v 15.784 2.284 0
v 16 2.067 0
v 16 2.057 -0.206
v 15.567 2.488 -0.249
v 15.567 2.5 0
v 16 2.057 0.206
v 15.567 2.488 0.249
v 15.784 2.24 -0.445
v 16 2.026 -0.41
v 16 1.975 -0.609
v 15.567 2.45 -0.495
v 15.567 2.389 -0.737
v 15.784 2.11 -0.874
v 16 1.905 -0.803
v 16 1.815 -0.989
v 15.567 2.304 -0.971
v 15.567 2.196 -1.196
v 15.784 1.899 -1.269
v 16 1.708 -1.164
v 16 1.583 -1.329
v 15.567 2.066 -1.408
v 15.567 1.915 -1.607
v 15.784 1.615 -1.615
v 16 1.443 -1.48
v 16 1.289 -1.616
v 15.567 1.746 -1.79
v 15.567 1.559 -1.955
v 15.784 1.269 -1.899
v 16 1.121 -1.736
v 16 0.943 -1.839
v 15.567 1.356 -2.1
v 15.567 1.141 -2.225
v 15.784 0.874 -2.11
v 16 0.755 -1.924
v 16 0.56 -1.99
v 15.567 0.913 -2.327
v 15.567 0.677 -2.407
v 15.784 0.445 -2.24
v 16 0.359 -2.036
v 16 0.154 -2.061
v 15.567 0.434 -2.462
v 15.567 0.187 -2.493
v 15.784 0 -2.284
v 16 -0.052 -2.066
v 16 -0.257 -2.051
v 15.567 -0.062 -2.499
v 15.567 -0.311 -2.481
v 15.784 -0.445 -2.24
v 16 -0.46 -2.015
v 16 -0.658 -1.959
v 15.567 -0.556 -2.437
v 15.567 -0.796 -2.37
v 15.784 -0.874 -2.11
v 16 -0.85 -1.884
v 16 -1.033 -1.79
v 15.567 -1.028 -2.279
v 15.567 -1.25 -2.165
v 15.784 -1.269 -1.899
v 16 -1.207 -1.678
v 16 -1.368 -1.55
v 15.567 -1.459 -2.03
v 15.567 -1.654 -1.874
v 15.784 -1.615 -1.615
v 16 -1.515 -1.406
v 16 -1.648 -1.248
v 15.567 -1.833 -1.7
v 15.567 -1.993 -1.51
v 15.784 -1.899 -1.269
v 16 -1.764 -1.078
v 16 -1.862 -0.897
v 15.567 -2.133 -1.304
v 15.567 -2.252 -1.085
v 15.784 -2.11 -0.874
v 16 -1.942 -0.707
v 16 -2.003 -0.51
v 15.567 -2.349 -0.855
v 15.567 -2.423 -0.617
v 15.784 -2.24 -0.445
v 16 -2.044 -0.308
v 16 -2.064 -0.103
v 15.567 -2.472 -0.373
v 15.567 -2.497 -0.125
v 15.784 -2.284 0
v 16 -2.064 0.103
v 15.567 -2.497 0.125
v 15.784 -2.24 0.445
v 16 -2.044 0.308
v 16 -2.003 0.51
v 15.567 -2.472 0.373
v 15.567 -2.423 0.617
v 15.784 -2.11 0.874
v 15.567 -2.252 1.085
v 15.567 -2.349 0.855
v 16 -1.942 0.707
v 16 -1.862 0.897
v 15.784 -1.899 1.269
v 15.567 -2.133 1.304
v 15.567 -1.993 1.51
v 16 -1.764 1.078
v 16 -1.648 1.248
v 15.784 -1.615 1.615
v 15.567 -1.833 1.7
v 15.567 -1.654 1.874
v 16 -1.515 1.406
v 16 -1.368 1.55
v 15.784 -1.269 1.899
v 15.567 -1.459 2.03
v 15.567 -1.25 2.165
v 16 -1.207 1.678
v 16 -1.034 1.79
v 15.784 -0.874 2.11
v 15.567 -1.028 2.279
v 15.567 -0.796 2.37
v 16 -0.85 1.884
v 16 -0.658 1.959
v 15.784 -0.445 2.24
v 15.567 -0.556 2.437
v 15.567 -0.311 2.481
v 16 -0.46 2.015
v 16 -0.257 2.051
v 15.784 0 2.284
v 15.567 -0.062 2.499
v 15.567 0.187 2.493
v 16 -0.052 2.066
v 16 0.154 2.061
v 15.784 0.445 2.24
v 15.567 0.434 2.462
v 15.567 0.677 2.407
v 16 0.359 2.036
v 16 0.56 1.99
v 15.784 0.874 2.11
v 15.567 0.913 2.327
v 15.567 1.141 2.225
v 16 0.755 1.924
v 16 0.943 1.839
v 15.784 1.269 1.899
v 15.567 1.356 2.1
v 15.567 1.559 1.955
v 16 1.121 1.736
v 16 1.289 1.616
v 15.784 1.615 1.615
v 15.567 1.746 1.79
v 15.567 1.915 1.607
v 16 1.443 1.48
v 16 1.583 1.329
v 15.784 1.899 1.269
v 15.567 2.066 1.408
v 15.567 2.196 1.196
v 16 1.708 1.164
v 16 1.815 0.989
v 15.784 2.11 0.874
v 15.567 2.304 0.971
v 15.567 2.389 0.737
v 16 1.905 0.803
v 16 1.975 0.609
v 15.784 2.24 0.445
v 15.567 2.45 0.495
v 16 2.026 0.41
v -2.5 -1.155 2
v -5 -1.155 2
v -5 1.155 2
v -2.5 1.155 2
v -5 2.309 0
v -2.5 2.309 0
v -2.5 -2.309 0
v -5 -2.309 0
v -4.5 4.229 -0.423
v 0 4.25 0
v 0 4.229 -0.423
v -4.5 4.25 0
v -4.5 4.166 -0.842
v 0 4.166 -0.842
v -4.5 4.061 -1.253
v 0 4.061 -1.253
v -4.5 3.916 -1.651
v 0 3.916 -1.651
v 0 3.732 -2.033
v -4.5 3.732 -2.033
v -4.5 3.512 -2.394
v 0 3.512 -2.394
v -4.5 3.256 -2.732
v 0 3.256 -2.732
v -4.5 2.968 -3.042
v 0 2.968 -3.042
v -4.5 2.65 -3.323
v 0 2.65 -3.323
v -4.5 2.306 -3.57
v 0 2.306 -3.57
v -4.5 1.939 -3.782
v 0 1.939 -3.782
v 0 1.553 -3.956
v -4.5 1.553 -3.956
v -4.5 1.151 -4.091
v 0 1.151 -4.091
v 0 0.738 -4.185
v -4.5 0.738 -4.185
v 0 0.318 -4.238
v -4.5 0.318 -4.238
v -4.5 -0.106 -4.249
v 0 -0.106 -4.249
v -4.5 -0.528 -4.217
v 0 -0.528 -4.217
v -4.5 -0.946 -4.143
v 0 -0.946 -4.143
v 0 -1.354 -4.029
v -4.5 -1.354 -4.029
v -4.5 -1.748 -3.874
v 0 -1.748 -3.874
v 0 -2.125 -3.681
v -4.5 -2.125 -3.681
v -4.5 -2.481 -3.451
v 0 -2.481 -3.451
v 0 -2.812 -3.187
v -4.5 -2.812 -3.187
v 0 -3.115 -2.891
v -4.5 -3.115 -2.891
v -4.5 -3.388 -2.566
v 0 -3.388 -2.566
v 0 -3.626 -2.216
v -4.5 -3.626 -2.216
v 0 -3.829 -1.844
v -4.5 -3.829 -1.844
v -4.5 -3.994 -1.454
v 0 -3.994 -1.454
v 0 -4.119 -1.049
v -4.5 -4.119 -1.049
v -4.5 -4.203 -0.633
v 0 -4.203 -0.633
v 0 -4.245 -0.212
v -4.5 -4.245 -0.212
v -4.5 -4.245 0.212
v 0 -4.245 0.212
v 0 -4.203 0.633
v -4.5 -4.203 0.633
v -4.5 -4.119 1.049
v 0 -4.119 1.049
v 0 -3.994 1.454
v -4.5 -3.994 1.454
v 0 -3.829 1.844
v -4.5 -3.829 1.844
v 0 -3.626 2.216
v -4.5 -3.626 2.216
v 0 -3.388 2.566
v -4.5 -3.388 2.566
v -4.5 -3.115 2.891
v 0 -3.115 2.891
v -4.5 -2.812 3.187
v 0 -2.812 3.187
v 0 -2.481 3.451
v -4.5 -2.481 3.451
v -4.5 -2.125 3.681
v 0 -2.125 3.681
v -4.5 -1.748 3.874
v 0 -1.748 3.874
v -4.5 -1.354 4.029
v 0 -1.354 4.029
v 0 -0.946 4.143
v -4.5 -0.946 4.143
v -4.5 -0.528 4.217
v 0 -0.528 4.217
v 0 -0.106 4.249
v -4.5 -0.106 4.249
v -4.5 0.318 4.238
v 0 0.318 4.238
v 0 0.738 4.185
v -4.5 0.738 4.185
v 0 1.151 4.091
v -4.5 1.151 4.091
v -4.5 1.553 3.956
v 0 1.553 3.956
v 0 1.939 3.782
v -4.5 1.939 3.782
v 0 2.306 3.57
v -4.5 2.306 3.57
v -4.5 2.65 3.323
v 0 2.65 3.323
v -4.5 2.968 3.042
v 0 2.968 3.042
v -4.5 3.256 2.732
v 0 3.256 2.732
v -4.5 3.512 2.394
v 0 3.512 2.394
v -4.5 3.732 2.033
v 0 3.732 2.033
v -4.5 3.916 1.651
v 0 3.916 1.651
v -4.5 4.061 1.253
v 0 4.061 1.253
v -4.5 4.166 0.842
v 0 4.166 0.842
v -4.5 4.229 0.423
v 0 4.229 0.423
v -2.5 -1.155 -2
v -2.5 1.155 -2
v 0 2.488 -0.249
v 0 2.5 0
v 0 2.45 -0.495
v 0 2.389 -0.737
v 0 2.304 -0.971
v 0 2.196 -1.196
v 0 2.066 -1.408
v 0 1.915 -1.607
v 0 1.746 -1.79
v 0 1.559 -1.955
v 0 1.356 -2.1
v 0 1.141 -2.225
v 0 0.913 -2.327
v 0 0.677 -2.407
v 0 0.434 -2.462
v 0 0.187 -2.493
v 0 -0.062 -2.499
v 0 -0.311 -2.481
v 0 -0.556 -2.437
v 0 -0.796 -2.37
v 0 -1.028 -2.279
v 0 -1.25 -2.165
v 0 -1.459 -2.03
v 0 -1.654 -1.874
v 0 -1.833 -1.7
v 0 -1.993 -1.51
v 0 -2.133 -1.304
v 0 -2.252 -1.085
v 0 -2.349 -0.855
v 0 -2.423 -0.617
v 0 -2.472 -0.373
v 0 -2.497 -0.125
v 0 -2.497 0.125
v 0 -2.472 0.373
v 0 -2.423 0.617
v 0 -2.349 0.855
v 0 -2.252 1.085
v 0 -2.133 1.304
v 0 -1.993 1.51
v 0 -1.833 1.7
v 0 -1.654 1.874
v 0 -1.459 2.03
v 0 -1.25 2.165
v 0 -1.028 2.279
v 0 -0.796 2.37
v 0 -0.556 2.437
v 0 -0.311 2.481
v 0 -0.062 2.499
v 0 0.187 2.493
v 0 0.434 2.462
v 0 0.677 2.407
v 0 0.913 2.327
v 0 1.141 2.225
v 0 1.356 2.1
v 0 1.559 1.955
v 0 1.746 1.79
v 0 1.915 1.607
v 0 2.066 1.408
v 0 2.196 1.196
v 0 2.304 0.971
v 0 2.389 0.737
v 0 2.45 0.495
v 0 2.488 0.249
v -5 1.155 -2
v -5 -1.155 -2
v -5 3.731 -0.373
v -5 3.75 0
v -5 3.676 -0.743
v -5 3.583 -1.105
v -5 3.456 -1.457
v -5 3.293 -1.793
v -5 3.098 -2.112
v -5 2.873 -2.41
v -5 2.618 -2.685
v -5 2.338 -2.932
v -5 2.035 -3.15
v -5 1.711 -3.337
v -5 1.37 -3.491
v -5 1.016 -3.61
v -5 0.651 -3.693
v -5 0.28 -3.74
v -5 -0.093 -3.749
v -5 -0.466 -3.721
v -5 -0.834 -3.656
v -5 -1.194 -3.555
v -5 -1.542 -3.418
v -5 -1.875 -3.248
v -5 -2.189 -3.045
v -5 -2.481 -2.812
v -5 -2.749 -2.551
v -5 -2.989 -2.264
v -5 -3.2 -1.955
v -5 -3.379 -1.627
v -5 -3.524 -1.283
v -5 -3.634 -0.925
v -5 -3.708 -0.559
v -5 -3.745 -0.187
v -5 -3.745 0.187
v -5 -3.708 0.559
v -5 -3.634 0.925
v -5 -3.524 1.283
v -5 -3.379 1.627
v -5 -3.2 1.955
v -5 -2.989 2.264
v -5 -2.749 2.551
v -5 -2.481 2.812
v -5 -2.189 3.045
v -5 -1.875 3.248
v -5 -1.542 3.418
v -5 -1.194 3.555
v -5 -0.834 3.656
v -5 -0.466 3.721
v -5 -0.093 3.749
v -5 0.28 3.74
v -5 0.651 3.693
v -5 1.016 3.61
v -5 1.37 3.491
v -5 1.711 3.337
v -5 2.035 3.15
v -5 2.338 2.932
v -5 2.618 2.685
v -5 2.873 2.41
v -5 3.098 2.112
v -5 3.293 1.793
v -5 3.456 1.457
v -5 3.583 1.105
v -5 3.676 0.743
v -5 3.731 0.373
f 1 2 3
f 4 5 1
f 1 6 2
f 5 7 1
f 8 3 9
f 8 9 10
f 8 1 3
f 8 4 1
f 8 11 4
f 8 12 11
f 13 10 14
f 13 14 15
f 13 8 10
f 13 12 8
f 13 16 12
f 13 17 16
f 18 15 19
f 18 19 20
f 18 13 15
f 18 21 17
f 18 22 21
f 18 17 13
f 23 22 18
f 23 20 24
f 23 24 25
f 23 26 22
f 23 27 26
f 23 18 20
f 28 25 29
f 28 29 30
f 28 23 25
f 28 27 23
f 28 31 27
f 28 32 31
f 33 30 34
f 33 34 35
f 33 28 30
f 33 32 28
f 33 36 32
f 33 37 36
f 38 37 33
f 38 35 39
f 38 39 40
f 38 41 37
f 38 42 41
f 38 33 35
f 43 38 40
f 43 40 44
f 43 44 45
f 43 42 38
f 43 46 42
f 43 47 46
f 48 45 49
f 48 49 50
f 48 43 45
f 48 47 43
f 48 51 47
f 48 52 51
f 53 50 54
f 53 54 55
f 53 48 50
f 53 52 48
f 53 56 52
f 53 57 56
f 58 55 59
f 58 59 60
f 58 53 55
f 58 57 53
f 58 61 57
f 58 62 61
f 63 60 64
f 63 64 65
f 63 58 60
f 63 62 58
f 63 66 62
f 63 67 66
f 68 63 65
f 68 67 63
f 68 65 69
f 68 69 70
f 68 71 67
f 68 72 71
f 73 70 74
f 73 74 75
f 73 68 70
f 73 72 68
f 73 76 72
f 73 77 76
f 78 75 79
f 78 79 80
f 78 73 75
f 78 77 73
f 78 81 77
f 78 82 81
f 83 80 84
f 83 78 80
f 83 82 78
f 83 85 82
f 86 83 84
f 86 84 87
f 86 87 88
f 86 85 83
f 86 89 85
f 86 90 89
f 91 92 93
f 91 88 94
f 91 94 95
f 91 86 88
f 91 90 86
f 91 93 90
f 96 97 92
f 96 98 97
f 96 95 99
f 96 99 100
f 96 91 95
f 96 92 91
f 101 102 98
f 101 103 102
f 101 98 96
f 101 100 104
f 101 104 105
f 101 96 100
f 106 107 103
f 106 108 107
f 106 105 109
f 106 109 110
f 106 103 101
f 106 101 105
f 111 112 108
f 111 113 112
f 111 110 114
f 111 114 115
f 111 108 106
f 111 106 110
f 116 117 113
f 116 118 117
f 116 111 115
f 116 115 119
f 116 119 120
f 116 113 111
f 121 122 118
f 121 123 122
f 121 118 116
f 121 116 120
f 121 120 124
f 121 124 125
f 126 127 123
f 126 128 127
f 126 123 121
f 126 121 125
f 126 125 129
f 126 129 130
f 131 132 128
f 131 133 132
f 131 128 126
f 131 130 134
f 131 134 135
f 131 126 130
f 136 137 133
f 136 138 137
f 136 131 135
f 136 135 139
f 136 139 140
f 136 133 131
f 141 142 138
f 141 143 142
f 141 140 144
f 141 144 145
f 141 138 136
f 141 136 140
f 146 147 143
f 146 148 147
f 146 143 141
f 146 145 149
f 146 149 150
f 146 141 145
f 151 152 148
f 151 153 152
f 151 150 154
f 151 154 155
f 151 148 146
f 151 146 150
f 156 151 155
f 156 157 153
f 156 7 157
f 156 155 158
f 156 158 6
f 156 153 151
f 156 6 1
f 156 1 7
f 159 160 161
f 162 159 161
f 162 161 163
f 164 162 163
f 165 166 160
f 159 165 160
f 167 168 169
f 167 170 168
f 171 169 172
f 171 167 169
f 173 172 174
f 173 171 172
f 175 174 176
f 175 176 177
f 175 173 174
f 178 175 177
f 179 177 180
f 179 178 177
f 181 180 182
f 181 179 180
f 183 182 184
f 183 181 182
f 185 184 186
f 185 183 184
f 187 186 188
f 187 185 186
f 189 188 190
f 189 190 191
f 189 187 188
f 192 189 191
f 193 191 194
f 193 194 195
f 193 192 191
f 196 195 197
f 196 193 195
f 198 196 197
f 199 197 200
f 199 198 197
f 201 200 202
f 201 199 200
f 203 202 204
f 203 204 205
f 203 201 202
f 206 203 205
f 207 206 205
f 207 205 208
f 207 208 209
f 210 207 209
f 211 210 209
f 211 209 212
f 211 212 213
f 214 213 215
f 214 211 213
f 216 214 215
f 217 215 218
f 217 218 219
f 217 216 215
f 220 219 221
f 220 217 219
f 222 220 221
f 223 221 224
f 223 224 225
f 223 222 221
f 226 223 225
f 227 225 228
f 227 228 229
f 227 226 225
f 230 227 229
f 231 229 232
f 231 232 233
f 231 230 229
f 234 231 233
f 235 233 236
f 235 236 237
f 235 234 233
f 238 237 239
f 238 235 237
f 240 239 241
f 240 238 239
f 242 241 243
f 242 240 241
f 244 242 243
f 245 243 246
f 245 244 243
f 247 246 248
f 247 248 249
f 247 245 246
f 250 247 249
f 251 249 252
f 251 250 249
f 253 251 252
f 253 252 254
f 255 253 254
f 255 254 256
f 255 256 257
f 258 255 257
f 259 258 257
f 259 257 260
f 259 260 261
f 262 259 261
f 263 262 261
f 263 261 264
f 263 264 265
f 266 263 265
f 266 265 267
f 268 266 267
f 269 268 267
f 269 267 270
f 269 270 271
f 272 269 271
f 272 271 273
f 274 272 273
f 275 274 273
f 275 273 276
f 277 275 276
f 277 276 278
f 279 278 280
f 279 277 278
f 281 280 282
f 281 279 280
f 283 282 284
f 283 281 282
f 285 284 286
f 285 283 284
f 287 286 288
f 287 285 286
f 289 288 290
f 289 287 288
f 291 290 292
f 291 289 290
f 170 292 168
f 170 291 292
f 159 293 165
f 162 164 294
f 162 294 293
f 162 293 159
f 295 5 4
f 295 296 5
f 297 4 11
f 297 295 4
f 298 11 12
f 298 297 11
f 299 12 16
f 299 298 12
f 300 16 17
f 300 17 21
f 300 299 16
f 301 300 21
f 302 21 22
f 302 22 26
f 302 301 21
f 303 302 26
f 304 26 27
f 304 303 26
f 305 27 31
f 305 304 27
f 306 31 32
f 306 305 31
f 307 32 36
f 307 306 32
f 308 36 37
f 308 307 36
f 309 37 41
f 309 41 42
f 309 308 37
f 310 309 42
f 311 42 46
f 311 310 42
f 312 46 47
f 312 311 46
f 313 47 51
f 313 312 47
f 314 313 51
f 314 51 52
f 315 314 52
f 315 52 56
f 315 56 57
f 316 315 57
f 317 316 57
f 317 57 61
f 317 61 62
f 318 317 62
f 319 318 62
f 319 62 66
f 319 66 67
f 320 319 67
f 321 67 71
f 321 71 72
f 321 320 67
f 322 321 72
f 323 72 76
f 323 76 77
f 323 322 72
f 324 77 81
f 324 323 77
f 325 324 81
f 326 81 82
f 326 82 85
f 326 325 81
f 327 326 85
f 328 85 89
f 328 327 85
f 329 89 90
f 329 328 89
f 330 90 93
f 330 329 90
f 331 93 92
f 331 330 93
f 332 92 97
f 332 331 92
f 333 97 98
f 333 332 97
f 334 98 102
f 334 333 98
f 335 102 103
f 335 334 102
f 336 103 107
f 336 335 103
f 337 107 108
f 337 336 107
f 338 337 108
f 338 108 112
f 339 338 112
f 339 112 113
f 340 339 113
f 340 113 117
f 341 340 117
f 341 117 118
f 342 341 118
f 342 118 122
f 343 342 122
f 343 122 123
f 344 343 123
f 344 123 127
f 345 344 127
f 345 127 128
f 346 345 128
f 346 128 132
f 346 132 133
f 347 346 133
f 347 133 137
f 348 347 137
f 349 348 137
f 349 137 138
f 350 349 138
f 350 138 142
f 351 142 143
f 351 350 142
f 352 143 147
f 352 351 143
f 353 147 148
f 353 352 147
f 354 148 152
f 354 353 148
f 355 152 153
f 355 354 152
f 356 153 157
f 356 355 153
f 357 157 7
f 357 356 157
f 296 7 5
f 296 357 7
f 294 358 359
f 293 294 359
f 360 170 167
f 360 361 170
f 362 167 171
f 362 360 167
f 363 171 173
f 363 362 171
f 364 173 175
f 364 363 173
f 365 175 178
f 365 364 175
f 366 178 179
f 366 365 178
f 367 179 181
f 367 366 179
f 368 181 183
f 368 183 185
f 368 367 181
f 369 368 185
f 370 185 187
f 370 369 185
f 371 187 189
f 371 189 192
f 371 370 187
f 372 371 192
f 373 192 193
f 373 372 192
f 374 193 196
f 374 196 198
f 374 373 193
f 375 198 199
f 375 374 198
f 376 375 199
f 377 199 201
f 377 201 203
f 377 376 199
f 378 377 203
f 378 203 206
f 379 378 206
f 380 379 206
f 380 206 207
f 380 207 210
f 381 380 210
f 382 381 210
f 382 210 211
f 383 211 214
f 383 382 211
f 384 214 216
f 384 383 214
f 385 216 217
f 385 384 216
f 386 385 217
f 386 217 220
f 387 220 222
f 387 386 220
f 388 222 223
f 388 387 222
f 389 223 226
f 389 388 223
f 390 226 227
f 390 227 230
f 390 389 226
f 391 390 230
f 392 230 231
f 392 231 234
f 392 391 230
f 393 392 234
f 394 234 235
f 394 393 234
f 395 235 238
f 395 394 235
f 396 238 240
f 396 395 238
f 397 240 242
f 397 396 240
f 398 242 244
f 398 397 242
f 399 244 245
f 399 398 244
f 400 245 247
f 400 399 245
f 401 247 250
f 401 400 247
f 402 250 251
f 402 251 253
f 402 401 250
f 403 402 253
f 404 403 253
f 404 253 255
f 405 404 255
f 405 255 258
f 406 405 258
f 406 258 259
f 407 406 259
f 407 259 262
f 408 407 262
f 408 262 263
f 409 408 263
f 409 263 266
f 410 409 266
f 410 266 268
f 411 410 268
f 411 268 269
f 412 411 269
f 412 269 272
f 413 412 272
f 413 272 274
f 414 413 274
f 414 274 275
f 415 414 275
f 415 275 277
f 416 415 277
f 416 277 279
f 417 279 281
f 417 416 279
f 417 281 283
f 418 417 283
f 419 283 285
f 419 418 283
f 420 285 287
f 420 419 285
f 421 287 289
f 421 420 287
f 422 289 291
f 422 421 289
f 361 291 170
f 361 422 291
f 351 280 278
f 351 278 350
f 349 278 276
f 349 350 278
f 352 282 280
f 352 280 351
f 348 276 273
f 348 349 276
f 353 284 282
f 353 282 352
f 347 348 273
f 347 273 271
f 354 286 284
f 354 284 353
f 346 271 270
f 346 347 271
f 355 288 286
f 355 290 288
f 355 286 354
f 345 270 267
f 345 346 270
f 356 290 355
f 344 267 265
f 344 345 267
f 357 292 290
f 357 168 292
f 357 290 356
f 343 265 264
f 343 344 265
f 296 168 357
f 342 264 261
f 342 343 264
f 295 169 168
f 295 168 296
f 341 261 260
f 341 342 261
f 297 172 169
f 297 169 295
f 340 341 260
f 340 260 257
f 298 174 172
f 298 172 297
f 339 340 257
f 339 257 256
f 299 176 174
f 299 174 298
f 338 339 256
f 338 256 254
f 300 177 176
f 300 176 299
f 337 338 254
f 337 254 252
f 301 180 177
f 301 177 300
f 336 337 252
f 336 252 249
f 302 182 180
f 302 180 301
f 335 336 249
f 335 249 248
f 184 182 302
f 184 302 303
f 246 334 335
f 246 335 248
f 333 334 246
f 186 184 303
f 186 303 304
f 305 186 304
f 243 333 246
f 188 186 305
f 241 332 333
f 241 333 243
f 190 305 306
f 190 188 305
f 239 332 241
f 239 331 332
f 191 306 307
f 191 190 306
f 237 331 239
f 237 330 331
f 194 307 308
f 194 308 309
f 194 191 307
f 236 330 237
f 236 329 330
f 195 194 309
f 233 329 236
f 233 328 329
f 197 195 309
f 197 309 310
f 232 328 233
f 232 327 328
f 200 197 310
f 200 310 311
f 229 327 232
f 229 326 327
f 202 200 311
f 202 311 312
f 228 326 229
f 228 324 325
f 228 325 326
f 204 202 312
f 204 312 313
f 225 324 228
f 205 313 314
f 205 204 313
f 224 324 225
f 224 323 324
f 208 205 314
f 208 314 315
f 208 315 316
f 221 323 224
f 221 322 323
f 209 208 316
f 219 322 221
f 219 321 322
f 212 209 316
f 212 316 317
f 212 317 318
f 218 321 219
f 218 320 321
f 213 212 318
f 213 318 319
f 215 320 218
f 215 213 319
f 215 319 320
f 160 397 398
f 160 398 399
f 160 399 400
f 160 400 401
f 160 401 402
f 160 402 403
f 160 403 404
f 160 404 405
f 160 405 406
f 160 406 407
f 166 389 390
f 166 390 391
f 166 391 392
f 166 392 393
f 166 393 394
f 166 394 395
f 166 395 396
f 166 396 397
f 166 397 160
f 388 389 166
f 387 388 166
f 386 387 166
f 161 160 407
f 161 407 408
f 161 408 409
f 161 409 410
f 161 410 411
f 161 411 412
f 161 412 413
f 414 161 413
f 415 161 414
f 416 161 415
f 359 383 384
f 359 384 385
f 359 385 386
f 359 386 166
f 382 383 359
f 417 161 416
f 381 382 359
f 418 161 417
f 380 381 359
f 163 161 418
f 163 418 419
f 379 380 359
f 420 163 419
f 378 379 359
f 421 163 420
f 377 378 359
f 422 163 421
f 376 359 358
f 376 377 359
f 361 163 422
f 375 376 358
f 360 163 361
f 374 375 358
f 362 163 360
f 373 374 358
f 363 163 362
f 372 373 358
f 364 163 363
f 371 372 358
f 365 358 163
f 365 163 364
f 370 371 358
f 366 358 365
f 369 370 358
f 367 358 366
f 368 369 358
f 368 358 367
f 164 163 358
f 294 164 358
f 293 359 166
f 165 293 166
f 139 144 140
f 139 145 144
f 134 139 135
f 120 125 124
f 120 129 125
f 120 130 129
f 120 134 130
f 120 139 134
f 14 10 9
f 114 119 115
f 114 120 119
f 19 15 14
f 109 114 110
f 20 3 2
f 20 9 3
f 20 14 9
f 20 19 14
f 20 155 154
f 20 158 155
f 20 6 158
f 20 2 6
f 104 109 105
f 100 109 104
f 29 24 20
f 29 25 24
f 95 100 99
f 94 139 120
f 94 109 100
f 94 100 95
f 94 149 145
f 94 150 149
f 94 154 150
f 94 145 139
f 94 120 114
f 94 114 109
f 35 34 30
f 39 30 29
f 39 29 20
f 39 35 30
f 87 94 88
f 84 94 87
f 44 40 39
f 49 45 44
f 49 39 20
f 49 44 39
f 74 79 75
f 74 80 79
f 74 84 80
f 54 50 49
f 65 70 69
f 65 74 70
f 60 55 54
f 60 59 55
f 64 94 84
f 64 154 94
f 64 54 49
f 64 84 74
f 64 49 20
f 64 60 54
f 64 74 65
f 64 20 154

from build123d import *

# Parameters (mm, degrees)
CUT_EXTRUDE1_DEPTH = 2.5


with BuildPart() as part:
    # Sketch1 → Revolve1 (revolve)
    with BuildSketch(Plane.XY):
        Polygon((0, 2.5), (0, 4.25), (-4.5, 4.25), (-5, 3.75), (-5, 0), (16, 0), (16, 2.067), (15.567, 2.5), align=None)
    revolve(axis=Axis((16, 0, 0), (-1, 0, 0)))

    # Sketch2 → Cut-Extrude1 (cut)
    with BuildSketch(Plane.ZY.offset(5)):
        Polygon((0, 2.309401077), (-2, 1.154700538), (-2, -1.154700538), (0, -2.309401077), (2, -1.154700538), (2, 1.154700538), align=None)
    extrude(amount=-CUT_EXTRUDE1_DEPTH, mode=Mode.SUBTRACT)


solid = part.part
